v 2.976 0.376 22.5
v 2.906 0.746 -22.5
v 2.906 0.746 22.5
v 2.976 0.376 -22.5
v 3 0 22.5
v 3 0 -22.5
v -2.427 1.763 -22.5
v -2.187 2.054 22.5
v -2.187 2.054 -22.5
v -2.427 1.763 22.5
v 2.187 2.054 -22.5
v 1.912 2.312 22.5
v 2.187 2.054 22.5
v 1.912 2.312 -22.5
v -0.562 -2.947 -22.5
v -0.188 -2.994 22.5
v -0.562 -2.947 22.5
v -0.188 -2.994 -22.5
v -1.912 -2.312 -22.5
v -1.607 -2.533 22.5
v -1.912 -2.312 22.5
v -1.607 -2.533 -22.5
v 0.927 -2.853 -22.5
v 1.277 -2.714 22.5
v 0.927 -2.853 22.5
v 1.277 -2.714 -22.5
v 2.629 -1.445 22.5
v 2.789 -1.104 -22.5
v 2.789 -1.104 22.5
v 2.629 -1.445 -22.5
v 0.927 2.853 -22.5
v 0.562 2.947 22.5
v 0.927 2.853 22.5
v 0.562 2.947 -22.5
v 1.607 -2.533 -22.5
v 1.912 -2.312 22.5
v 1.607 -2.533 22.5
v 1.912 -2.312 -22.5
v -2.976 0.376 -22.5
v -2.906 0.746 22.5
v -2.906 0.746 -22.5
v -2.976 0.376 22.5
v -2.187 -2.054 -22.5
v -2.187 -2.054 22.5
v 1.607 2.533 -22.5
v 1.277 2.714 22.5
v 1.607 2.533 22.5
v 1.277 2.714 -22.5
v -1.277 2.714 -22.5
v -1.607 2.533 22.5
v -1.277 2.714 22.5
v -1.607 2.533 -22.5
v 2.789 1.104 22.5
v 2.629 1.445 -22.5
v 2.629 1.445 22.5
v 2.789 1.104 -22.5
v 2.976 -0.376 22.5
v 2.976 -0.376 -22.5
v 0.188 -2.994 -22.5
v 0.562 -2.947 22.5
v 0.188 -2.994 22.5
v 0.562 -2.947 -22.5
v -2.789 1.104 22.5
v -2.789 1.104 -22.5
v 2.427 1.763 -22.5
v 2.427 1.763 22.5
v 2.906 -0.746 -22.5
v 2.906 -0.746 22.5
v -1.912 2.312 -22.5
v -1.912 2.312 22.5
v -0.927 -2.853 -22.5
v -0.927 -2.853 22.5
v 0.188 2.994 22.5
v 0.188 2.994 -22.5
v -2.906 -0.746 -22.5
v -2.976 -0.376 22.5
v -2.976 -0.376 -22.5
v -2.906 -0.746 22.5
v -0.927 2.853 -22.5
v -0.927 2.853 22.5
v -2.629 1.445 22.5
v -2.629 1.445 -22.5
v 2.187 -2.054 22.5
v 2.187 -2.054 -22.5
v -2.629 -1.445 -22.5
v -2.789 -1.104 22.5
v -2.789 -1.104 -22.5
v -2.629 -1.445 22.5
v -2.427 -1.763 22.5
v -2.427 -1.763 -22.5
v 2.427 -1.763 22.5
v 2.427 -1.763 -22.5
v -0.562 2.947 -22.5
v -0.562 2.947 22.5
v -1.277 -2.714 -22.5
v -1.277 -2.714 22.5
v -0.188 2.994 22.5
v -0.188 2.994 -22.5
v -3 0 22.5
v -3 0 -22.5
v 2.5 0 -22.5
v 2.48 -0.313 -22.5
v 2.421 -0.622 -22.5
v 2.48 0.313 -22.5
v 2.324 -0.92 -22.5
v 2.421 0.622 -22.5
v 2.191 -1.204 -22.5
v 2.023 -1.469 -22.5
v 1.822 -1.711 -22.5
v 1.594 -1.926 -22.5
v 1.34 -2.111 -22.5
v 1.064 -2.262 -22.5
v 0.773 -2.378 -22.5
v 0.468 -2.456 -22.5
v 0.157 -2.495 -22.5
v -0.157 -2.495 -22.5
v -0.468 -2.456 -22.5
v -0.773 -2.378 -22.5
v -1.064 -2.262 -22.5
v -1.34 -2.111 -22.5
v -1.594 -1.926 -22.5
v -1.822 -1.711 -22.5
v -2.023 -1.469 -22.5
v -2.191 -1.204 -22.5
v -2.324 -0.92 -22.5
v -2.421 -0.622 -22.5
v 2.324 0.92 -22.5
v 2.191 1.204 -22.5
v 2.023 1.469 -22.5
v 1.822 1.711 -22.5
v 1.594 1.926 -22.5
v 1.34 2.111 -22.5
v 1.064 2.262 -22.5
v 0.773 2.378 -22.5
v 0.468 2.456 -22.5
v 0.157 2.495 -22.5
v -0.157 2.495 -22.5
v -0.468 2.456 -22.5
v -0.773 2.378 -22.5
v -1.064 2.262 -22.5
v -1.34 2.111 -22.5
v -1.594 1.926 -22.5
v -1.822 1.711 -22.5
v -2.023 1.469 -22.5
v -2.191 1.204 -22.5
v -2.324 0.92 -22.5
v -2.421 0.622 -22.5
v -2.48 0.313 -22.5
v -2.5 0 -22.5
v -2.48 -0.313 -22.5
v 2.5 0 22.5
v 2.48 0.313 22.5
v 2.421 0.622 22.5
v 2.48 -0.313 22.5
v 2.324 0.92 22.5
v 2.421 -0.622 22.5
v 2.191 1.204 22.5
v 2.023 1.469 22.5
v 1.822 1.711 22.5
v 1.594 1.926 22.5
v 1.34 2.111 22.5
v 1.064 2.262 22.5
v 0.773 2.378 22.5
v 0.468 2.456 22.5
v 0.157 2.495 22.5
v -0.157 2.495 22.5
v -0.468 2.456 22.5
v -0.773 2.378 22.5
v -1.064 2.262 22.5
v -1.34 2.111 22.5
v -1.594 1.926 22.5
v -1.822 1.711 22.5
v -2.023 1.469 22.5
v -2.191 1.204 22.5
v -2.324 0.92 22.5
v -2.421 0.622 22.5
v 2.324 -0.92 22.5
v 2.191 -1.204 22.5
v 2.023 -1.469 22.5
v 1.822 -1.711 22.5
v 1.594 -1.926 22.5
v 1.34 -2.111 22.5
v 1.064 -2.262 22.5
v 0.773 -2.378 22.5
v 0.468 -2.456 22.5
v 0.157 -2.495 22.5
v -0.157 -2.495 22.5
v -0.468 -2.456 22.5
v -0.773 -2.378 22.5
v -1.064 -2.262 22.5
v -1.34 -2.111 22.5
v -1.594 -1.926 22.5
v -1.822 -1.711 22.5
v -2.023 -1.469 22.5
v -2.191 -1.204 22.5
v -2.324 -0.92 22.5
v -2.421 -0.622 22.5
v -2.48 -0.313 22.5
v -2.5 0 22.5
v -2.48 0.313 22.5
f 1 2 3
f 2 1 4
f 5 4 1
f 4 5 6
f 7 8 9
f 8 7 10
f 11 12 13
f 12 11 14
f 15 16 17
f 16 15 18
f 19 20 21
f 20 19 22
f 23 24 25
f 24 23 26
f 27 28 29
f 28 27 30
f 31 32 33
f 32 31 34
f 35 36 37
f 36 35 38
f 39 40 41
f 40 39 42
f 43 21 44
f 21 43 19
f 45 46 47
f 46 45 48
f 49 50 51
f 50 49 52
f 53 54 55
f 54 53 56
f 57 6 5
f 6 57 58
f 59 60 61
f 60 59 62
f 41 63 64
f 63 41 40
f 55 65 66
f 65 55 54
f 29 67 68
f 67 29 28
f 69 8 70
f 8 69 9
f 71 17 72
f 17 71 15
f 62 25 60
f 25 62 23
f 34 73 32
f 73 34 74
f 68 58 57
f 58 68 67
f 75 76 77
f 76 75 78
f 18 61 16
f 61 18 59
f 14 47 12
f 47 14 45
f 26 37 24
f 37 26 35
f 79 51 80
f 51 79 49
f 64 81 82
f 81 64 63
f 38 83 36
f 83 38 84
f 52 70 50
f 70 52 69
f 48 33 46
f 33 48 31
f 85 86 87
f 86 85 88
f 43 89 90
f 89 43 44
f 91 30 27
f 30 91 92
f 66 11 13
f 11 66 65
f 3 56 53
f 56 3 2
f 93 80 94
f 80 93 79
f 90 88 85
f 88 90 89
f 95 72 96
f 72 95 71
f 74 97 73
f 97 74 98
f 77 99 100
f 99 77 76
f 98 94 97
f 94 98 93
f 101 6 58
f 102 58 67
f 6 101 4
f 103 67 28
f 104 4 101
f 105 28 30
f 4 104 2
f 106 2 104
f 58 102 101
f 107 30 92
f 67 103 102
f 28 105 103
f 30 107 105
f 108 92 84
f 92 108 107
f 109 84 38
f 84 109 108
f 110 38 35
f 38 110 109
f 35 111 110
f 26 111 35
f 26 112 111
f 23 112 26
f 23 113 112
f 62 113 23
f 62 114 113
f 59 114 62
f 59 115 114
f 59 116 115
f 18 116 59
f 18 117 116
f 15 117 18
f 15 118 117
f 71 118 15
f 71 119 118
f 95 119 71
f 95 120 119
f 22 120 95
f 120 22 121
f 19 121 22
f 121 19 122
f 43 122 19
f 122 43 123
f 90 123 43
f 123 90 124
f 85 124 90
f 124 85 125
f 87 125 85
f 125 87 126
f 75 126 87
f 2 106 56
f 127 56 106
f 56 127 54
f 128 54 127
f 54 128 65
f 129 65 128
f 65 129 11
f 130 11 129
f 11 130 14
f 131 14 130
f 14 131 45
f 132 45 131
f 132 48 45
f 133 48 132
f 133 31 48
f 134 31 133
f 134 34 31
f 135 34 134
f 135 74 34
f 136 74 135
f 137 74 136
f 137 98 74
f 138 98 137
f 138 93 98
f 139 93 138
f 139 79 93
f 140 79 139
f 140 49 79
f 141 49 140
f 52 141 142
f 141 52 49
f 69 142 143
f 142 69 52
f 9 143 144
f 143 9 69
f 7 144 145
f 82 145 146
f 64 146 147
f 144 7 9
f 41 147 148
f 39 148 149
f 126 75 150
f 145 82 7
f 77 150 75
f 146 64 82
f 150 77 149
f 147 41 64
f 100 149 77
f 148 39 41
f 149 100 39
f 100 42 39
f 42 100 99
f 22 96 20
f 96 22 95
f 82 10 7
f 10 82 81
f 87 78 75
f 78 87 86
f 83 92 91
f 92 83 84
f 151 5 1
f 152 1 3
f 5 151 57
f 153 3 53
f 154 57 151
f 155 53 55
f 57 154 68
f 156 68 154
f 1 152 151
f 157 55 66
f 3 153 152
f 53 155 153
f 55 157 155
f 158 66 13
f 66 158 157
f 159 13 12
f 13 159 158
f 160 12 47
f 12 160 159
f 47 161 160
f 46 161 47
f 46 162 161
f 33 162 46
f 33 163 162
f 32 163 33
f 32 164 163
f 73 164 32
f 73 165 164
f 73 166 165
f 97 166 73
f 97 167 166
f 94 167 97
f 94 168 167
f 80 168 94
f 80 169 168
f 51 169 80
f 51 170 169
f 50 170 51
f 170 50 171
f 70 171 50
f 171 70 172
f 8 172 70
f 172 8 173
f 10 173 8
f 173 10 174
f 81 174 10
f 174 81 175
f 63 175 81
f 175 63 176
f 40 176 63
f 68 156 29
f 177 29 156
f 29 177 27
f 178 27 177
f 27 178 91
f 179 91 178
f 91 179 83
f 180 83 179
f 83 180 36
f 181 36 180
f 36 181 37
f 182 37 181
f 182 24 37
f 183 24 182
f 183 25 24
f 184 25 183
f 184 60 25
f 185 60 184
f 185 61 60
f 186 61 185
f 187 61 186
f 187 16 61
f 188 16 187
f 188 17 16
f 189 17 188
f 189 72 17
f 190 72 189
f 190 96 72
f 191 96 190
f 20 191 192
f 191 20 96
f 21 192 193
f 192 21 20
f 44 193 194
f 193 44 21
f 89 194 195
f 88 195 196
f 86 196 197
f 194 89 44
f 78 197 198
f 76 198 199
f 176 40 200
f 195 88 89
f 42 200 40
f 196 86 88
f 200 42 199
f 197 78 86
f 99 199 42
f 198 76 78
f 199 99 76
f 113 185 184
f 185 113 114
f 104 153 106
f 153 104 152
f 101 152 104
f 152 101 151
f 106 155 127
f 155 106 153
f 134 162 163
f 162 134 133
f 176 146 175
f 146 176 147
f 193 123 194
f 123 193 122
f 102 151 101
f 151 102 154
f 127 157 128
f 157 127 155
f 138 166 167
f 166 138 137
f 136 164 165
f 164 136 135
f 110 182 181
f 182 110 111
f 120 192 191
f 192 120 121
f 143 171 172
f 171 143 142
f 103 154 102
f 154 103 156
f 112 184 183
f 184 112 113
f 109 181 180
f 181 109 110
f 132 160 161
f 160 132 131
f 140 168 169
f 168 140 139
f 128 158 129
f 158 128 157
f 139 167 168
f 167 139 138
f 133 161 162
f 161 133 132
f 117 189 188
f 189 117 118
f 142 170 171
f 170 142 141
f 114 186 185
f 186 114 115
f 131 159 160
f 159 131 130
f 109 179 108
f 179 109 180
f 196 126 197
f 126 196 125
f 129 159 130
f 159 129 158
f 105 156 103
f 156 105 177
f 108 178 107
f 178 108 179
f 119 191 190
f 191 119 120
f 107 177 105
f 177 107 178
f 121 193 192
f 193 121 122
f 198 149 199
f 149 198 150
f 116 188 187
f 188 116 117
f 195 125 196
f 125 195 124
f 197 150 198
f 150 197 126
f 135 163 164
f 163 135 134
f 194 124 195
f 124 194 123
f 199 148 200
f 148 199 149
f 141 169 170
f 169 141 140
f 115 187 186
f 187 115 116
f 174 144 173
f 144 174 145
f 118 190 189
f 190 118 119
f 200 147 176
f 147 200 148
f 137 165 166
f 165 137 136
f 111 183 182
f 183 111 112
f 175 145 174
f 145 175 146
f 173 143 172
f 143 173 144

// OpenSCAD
$fn = 50;


difference() {
	union() {
		translate(v = [0, 0, -22.5000000000]) {
			cylinder(h = 45, r = 3.0000000000);
		}
	}
	union() {
		translate(v = [0, 0, -100.0000000000]) {
			cylinder(h = 200, r = 2.5000000000);
		}
	}
}
